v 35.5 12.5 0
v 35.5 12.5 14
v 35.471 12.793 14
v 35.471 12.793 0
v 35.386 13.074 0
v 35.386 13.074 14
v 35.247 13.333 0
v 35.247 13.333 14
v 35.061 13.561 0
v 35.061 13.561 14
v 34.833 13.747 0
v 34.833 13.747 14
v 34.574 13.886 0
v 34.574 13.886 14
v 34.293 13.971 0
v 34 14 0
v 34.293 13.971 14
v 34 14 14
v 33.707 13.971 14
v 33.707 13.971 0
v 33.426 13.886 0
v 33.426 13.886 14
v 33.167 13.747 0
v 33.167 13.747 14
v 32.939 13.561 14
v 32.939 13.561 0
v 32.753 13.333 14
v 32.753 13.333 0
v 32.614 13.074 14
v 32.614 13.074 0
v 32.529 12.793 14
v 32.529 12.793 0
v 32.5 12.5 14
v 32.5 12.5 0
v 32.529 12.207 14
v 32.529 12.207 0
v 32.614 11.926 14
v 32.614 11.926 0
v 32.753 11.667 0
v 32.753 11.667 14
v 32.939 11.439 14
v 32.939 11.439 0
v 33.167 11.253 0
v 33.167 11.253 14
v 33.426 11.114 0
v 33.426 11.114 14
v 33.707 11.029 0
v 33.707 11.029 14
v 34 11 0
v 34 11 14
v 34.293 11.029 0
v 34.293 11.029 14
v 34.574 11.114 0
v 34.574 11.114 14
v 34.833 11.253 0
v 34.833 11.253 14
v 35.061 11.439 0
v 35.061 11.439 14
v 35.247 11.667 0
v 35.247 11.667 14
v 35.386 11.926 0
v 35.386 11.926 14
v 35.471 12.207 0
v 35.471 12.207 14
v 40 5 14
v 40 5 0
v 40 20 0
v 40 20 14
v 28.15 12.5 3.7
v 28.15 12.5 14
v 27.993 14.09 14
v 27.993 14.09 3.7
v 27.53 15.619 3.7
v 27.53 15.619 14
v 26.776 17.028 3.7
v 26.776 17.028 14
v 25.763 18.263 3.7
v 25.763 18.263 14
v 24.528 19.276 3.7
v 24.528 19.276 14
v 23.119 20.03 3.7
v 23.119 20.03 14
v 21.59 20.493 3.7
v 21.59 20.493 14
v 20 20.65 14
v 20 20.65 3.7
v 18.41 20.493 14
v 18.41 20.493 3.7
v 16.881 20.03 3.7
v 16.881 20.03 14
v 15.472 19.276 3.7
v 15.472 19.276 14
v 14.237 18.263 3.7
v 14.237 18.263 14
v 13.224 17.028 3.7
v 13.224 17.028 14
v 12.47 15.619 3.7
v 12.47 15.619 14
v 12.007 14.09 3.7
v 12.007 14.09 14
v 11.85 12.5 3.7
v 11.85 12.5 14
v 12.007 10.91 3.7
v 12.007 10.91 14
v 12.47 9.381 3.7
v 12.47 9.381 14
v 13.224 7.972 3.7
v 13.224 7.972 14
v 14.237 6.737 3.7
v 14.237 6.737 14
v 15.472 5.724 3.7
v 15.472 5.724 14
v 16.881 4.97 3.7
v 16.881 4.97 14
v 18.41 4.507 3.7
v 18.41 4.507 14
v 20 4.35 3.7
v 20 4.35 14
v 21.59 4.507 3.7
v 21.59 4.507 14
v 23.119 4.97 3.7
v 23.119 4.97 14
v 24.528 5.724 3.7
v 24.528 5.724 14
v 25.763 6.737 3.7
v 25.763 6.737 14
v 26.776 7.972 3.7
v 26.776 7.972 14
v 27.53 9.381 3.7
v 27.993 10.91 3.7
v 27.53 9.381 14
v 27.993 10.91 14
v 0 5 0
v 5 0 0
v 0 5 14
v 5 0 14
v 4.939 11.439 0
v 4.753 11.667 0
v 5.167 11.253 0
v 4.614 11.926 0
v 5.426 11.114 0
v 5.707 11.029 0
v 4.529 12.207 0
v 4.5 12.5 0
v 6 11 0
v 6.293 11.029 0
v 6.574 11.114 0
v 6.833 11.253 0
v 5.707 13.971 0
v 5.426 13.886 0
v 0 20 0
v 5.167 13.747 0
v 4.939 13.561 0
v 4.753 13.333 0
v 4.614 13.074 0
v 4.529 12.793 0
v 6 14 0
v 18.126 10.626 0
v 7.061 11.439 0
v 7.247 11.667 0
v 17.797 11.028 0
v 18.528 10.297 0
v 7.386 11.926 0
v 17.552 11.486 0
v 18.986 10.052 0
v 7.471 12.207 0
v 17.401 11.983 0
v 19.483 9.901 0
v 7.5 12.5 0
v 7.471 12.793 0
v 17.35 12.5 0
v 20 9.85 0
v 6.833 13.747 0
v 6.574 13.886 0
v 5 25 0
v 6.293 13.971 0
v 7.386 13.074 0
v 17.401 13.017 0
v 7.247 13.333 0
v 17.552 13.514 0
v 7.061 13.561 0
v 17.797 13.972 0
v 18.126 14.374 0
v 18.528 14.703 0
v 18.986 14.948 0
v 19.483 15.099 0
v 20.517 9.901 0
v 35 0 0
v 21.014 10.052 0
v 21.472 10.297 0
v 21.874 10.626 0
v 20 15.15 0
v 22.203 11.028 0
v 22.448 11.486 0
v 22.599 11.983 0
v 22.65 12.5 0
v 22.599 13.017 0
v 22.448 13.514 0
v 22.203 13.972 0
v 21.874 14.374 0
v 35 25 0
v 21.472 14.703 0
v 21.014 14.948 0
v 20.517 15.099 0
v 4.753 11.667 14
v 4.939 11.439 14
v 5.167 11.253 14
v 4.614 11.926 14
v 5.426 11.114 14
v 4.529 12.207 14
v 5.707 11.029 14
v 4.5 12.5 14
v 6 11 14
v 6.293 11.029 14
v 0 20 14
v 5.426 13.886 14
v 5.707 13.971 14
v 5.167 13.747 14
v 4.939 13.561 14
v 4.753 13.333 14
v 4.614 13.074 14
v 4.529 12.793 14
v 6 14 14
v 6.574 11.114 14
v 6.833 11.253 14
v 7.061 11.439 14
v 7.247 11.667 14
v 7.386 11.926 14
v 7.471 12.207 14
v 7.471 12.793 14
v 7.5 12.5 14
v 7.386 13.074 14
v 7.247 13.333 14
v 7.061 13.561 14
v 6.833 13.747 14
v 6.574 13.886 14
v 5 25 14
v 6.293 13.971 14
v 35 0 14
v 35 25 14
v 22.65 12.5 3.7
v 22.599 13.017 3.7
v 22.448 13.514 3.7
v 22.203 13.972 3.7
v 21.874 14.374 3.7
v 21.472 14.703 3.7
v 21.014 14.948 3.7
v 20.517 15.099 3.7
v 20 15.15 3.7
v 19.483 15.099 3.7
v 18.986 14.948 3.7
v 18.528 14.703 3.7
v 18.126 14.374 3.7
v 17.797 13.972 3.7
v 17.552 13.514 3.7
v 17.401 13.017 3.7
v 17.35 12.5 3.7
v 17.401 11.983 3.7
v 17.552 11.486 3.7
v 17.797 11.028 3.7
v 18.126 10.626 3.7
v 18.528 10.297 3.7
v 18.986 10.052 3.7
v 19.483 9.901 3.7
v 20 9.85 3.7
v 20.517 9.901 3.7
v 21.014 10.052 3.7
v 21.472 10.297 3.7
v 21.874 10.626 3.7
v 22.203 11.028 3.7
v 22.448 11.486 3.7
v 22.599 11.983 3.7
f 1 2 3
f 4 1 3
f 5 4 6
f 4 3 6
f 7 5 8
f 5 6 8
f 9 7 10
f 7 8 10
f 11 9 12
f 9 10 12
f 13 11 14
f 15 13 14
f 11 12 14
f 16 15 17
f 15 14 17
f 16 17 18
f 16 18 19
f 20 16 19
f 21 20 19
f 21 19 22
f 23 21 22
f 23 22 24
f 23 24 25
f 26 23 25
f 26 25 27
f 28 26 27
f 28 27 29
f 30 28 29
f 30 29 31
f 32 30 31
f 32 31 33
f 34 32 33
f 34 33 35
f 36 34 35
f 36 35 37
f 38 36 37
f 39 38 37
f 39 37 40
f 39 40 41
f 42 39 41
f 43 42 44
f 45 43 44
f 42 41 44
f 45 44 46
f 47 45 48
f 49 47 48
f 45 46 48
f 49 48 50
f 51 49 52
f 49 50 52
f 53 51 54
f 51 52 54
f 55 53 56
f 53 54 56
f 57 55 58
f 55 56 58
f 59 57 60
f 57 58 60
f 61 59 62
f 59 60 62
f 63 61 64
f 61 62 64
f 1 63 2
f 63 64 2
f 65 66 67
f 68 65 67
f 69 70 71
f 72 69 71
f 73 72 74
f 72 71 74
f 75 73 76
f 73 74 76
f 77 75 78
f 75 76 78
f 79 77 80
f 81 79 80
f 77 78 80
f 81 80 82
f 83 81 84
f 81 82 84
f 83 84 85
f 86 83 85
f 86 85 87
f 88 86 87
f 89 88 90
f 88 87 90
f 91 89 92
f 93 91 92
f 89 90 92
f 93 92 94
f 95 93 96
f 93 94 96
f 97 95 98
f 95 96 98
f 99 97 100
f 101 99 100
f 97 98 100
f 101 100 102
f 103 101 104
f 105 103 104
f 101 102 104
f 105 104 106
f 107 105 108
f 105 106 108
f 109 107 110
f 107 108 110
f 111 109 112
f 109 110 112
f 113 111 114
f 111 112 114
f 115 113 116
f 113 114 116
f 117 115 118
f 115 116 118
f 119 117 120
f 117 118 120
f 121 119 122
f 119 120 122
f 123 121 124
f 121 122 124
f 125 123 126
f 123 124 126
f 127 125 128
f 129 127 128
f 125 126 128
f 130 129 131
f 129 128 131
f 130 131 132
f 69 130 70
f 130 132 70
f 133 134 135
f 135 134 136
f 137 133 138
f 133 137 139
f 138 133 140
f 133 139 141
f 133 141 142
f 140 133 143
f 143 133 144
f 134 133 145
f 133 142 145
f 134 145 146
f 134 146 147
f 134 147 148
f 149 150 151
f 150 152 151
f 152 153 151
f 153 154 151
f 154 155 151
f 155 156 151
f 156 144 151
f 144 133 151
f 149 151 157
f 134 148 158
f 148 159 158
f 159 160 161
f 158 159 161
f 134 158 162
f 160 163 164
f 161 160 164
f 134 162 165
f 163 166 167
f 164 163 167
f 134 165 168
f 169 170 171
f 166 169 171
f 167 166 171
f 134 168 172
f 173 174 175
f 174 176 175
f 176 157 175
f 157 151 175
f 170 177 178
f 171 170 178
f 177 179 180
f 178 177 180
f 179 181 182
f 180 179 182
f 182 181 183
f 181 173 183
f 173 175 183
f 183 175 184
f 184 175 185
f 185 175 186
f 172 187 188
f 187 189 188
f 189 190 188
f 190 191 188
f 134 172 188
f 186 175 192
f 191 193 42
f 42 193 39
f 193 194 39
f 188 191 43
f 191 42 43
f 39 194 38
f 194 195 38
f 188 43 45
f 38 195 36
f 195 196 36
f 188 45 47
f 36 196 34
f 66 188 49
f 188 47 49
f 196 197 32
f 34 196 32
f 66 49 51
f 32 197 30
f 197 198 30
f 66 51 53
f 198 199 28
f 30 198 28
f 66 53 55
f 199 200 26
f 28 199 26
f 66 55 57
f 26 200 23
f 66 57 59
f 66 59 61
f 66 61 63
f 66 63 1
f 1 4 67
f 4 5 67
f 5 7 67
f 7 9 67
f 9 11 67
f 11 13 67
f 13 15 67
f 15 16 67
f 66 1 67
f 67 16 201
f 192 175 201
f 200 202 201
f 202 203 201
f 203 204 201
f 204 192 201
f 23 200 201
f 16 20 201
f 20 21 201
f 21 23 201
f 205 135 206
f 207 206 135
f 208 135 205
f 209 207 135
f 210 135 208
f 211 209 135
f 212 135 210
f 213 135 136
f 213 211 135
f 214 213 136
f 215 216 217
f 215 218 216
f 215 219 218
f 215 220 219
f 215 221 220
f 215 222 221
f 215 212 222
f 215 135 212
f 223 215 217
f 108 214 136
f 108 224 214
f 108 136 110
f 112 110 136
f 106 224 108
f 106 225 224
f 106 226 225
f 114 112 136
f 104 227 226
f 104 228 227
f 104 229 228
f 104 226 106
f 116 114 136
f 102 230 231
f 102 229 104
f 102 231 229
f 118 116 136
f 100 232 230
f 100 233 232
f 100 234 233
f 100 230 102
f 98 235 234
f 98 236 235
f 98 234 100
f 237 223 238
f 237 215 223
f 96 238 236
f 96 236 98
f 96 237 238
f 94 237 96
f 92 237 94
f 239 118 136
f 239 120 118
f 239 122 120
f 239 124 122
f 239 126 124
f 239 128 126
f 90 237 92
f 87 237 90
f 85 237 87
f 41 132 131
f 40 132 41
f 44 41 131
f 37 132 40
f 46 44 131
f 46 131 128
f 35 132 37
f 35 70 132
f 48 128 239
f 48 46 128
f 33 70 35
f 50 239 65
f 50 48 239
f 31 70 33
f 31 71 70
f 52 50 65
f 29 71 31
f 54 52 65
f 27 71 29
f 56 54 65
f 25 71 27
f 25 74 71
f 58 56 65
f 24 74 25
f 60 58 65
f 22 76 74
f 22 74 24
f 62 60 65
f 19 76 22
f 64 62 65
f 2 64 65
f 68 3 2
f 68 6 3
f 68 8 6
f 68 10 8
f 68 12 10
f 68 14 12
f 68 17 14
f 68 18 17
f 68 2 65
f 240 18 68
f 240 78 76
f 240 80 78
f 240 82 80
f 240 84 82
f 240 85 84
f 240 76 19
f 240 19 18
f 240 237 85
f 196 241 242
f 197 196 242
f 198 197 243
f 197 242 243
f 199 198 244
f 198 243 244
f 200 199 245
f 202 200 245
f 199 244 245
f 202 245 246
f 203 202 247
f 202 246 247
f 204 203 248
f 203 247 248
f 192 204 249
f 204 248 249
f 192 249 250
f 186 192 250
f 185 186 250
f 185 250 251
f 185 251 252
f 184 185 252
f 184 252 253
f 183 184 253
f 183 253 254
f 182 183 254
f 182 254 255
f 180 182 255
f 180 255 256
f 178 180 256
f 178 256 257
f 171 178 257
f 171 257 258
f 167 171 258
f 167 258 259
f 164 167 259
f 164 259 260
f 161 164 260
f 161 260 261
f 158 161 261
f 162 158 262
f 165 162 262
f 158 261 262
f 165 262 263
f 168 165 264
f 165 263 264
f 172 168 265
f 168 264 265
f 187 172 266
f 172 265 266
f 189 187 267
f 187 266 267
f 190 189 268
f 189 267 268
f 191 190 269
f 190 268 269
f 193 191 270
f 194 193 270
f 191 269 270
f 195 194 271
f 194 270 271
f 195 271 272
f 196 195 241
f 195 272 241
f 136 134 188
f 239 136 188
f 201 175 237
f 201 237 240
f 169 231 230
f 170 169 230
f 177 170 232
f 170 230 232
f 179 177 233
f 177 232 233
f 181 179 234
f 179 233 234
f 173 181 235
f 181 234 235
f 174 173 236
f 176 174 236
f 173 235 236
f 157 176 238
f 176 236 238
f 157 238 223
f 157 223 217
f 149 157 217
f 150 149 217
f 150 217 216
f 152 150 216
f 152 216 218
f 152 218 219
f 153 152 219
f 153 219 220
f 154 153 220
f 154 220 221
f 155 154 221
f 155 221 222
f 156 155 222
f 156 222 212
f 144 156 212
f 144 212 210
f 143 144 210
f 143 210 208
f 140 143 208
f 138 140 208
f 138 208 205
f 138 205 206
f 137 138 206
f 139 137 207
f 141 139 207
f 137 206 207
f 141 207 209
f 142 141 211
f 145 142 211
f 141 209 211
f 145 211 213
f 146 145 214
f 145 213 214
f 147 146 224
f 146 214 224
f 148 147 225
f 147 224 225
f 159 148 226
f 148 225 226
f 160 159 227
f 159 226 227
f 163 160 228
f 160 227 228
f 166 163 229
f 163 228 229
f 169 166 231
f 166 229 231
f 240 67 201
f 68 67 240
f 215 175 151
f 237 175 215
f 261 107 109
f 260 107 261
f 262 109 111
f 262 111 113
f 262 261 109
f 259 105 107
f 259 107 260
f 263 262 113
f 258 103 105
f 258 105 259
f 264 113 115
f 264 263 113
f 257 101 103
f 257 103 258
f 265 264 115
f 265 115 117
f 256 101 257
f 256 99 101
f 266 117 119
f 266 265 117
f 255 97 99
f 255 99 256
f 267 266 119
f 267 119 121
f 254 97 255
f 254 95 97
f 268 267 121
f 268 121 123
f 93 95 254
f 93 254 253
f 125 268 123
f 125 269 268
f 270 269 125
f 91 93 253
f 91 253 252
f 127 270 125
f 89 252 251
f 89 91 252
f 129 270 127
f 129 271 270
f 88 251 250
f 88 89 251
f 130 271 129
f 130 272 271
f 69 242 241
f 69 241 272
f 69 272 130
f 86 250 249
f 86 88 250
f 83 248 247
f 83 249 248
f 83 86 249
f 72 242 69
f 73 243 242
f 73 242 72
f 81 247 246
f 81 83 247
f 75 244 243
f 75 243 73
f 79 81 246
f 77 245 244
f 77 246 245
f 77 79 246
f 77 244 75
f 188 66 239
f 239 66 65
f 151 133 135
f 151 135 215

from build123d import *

# Parameters (mm, degrees)
SKETCH1_W           = 40
SKETCH1_H           = 25
BOSS_EXTRUDE1_DEPTH = 14
SKETCH2_R           = 8.15
CUT_EXTRUDE1_DEPTH  = 10.3
CUT_EXTRUDE2_REACH  = 50.281
SKETCH3_R           = 2.65
CUT_EXTRUDE3_REACH  = 51.204
SKETCH4_R           = 1.5
CHAMFER1_SIZE       = 5


with BuildPart() as part:
    # Sketch1 → Boss-Extrude1 (new body)
    with BuildSketch(Plane.XY):
        with Locations((20, 12.5)):
            Rectangle(SKETCH1_W, SKETCH1_H)
    extrude(amount=BOSS_EXTRUDE1_DEPTH)

    # Sketch2 → Cut-Extrude1 (cut)
    with BuildSketch(Plane.XY.offset(14)):
        with Locations((20, 12.5)):
            Circle(SKETCH2_R)
    extrude(amount=-CUT_EXTRUDE1_DEPTH, mode=Mode.SUBTRACT)

    # Sketch3 → Cut-Extrude2 (cut, up to next)
    with BuildSketch(Plane.XY.offset(3.7), mode=Mode.PRIVATE) as cut_extrude2_sk1:
        with Locations((20, 12.5)):
            Circle(SKETCH3_R)
    cut_extrude2_tool1 = extrude(cut_extrude2_sk1.sketch, amount=-CUT_EXTRUDE2_REACH, mode=Mode.PRIVATE) & part.part
    add(cut_extrude2_tool1.solids().sort_by_distance((20, 12.5, 3.7))[0], mode=Mode.SUBTRACT)

    # Sketch4 → Cut-Extrude3 (cut, up to next)
    with BuildSketch(Plane.XY.offset(14), mode=Mode.PRIVATE) as cut_extrude3_sk1:
        with Locations((6, 12.5)):
            Circle(SKETCH4_R)
    cut_extrude3_tool1 = extrude(cut_extrude3_sk1.sketch, amount=-CUT_EXTRUDE3_REACH, mode=Mode.PRIVATE) & part.part
    # Sketch4 → Cut-Extrude3 (cut, up to next)
    with BuildSketch(Plane.XY.offset(14), mode=Mode.PRIVATE) as cut_extrude3_sk2:
        with Locations((34, 12.5)):
            Circle(SKETCH4_R)
    cut_extrude3_tool2 = extrude(cut_extrude3_sk2.sketch, amount=-CUT_EXTRUDE3_REACH, mode=Mode.PRIVATE) & part.part
    add(cut_extrude3_tool1.solids().sort_by_distance((6, 12.5, 14))[0], mode=Mode.SUBTRACT)
    add(cut_extrude3_tool2.solids().sort_by_distance((34, 12.5, 14))[0], mode=Mode.SUBTRACT)

    # Chamfer1
    chamfer1_edges = [part.edges().sort_by_distance(p)[0] for p in [
        (0, 25, 7),
        (40, 25, 7),
        (40, 0, 7),
        (0, 0, 7),
    ]]
    chamfer(chamfer1_edges, length=CHAMFER1_SIZE)


solid = part.part
